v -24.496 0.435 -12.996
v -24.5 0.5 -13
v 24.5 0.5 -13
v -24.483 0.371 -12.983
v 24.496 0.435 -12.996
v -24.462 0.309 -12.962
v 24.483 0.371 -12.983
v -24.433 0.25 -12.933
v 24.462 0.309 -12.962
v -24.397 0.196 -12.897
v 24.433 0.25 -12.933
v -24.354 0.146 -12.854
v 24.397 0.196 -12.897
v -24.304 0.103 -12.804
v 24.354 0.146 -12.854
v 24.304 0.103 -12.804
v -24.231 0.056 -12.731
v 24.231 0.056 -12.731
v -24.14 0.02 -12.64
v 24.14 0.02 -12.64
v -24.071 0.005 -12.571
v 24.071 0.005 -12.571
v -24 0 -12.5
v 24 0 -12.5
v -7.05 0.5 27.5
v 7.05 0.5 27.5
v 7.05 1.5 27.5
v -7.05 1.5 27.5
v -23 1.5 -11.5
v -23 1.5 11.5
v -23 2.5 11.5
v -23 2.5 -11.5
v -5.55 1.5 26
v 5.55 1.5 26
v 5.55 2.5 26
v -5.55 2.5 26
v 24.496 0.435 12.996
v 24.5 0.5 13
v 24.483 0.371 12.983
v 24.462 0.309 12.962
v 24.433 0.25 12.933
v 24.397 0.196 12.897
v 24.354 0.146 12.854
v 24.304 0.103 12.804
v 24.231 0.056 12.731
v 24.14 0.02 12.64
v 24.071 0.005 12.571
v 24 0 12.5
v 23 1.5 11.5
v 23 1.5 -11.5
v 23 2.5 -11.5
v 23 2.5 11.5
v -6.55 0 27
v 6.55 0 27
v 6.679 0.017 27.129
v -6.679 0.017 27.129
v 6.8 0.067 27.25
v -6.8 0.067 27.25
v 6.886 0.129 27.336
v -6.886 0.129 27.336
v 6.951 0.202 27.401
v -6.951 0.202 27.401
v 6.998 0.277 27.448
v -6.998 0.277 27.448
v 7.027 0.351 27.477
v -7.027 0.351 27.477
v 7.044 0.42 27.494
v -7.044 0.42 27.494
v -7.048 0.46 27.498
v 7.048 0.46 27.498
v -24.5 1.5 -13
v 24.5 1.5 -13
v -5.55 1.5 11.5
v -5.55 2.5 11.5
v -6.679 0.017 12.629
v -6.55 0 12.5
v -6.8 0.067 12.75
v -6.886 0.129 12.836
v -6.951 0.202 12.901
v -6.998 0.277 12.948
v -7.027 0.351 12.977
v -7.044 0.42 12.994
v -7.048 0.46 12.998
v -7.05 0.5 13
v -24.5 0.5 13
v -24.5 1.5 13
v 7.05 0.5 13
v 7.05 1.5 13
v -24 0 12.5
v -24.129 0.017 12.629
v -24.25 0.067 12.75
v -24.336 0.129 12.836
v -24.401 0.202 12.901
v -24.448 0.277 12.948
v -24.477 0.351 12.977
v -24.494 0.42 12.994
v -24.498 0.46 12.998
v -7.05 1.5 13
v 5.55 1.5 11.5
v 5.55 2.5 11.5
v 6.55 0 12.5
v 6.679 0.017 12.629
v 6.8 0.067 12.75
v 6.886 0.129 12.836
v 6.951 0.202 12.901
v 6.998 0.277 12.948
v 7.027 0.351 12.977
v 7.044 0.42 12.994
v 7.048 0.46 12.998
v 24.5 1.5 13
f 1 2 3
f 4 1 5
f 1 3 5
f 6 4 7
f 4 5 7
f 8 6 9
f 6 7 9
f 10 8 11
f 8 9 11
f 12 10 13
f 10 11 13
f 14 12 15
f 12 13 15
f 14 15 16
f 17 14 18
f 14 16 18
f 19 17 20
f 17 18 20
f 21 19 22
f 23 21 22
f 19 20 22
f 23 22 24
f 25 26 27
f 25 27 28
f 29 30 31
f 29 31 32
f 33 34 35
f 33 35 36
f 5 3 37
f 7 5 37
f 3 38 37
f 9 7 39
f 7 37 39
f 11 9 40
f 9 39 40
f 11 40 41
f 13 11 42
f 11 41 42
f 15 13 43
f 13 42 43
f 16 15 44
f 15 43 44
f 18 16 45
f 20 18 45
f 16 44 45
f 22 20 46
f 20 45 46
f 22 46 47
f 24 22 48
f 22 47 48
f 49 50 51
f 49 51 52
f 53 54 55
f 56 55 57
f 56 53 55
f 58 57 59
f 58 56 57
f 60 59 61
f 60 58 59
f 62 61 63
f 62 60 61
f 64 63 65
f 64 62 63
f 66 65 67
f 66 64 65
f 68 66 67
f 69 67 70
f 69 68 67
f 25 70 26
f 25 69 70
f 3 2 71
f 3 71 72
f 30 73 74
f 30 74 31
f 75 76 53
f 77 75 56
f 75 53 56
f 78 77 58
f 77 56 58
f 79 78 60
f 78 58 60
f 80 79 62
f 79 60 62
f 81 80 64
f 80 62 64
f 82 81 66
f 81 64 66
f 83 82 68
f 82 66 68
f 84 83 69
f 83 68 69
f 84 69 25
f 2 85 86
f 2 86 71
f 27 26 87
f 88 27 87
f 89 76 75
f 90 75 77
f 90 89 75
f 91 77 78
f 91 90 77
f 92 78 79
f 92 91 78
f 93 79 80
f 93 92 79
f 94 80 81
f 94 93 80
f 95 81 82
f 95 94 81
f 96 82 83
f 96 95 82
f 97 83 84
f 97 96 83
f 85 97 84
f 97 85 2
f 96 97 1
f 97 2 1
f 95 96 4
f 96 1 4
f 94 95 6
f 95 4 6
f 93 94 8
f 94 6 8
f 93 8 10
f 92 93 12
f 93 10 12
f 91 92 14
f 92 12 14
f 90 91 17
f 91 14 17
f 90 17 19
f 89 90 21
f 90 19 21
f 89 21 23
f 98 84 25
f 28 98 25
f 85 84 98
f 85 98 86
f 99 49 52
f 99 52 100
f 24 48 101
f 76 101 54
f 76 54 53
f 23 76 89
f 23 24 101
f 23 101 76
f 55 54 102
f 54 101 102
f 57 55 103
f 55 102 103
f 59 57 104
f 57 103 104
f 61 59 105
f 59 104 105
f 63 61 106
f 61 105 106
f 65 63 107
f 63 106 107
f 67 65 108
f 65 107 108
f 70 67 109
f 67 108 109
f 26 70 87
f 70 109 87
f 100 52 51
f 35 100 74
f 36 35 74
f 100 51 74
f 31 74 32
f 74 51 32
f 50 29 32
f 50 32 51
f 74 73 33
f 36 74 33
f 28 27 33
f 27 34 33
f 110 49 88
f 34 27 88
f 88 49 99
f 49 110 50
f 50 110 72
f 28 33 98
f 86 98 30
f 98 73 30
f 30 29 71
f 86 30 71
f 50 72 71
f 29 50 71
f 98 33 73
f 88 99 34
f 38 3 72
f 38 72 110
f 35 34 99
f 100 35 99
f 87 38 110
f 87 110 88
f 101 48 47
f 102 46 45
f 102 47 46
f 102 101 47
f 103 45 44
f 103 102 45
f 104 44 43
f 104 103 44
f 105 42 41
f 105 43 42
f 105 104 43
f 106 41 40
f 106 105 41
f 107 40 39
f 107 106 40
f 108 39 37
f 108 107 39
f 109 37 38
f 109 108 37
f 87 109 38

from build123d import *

# Parameters (mm, degrees)
EXTRUDE_1_DEPTH = 1.5
EXTRUDE_2_DEPTH = 1
FILLET_1_R      = 0.5


with BuildPart() as part:
    # 草图1 → 凸台-拉伸1 (new body)
    with BuildSketch(Plane(origin=(0, 0, 0), x_dir=(1, 0, 0), z_dir=(0, 1, 0))):
        Polygon((-24.5, 13), (24.5, 13), (24.5, -13), (7.05, -13), (7.05, -26), (7.05, -27.5), (-7.05, -27.5), (-7.05, -26), (-7.05, -13), (-24.5, -13), align=None)
    extrude(amount=EXTRUDE_1_DEPTH)

    # 草图2 → 凸台-拉伸2 (add)
    with BuildSketch(Plane(origin=(0, 1.5, 0), x_dir=(1, 0, 0), z_dir=(0, 1, 0))):
        Polygon((23, 11.5), (23, -11.5), (5.55, -11.5), (5.55, -13), (5.55, -24.5), (5.55, -26), (-5.55, -26), (-5.55, -24.5), (-5.55, -13), (-5.55, -11.5), (-23, -11.5), (-23, 11.5), align=None)
    extrude(amount=EXTRUDE_2_DEPTH)

    # 圆角1
    fillet_1_edges = [part.edges().sort_by_distance(p)[0] for p in [
        (7.05, 0, 20.25),
        (0, 0, 27.5),
        (-7.05, 0, 20.25),
        (-15.775, 0, 13),
        (-24.5, 0, 0),
        (0, 0, -13),
        (24.5, 0, 0),
        (15.775, 0, 13),
    ]]
    fillet(fillet_1_edges, radius=FILLET_1_R)


solid = part.part
